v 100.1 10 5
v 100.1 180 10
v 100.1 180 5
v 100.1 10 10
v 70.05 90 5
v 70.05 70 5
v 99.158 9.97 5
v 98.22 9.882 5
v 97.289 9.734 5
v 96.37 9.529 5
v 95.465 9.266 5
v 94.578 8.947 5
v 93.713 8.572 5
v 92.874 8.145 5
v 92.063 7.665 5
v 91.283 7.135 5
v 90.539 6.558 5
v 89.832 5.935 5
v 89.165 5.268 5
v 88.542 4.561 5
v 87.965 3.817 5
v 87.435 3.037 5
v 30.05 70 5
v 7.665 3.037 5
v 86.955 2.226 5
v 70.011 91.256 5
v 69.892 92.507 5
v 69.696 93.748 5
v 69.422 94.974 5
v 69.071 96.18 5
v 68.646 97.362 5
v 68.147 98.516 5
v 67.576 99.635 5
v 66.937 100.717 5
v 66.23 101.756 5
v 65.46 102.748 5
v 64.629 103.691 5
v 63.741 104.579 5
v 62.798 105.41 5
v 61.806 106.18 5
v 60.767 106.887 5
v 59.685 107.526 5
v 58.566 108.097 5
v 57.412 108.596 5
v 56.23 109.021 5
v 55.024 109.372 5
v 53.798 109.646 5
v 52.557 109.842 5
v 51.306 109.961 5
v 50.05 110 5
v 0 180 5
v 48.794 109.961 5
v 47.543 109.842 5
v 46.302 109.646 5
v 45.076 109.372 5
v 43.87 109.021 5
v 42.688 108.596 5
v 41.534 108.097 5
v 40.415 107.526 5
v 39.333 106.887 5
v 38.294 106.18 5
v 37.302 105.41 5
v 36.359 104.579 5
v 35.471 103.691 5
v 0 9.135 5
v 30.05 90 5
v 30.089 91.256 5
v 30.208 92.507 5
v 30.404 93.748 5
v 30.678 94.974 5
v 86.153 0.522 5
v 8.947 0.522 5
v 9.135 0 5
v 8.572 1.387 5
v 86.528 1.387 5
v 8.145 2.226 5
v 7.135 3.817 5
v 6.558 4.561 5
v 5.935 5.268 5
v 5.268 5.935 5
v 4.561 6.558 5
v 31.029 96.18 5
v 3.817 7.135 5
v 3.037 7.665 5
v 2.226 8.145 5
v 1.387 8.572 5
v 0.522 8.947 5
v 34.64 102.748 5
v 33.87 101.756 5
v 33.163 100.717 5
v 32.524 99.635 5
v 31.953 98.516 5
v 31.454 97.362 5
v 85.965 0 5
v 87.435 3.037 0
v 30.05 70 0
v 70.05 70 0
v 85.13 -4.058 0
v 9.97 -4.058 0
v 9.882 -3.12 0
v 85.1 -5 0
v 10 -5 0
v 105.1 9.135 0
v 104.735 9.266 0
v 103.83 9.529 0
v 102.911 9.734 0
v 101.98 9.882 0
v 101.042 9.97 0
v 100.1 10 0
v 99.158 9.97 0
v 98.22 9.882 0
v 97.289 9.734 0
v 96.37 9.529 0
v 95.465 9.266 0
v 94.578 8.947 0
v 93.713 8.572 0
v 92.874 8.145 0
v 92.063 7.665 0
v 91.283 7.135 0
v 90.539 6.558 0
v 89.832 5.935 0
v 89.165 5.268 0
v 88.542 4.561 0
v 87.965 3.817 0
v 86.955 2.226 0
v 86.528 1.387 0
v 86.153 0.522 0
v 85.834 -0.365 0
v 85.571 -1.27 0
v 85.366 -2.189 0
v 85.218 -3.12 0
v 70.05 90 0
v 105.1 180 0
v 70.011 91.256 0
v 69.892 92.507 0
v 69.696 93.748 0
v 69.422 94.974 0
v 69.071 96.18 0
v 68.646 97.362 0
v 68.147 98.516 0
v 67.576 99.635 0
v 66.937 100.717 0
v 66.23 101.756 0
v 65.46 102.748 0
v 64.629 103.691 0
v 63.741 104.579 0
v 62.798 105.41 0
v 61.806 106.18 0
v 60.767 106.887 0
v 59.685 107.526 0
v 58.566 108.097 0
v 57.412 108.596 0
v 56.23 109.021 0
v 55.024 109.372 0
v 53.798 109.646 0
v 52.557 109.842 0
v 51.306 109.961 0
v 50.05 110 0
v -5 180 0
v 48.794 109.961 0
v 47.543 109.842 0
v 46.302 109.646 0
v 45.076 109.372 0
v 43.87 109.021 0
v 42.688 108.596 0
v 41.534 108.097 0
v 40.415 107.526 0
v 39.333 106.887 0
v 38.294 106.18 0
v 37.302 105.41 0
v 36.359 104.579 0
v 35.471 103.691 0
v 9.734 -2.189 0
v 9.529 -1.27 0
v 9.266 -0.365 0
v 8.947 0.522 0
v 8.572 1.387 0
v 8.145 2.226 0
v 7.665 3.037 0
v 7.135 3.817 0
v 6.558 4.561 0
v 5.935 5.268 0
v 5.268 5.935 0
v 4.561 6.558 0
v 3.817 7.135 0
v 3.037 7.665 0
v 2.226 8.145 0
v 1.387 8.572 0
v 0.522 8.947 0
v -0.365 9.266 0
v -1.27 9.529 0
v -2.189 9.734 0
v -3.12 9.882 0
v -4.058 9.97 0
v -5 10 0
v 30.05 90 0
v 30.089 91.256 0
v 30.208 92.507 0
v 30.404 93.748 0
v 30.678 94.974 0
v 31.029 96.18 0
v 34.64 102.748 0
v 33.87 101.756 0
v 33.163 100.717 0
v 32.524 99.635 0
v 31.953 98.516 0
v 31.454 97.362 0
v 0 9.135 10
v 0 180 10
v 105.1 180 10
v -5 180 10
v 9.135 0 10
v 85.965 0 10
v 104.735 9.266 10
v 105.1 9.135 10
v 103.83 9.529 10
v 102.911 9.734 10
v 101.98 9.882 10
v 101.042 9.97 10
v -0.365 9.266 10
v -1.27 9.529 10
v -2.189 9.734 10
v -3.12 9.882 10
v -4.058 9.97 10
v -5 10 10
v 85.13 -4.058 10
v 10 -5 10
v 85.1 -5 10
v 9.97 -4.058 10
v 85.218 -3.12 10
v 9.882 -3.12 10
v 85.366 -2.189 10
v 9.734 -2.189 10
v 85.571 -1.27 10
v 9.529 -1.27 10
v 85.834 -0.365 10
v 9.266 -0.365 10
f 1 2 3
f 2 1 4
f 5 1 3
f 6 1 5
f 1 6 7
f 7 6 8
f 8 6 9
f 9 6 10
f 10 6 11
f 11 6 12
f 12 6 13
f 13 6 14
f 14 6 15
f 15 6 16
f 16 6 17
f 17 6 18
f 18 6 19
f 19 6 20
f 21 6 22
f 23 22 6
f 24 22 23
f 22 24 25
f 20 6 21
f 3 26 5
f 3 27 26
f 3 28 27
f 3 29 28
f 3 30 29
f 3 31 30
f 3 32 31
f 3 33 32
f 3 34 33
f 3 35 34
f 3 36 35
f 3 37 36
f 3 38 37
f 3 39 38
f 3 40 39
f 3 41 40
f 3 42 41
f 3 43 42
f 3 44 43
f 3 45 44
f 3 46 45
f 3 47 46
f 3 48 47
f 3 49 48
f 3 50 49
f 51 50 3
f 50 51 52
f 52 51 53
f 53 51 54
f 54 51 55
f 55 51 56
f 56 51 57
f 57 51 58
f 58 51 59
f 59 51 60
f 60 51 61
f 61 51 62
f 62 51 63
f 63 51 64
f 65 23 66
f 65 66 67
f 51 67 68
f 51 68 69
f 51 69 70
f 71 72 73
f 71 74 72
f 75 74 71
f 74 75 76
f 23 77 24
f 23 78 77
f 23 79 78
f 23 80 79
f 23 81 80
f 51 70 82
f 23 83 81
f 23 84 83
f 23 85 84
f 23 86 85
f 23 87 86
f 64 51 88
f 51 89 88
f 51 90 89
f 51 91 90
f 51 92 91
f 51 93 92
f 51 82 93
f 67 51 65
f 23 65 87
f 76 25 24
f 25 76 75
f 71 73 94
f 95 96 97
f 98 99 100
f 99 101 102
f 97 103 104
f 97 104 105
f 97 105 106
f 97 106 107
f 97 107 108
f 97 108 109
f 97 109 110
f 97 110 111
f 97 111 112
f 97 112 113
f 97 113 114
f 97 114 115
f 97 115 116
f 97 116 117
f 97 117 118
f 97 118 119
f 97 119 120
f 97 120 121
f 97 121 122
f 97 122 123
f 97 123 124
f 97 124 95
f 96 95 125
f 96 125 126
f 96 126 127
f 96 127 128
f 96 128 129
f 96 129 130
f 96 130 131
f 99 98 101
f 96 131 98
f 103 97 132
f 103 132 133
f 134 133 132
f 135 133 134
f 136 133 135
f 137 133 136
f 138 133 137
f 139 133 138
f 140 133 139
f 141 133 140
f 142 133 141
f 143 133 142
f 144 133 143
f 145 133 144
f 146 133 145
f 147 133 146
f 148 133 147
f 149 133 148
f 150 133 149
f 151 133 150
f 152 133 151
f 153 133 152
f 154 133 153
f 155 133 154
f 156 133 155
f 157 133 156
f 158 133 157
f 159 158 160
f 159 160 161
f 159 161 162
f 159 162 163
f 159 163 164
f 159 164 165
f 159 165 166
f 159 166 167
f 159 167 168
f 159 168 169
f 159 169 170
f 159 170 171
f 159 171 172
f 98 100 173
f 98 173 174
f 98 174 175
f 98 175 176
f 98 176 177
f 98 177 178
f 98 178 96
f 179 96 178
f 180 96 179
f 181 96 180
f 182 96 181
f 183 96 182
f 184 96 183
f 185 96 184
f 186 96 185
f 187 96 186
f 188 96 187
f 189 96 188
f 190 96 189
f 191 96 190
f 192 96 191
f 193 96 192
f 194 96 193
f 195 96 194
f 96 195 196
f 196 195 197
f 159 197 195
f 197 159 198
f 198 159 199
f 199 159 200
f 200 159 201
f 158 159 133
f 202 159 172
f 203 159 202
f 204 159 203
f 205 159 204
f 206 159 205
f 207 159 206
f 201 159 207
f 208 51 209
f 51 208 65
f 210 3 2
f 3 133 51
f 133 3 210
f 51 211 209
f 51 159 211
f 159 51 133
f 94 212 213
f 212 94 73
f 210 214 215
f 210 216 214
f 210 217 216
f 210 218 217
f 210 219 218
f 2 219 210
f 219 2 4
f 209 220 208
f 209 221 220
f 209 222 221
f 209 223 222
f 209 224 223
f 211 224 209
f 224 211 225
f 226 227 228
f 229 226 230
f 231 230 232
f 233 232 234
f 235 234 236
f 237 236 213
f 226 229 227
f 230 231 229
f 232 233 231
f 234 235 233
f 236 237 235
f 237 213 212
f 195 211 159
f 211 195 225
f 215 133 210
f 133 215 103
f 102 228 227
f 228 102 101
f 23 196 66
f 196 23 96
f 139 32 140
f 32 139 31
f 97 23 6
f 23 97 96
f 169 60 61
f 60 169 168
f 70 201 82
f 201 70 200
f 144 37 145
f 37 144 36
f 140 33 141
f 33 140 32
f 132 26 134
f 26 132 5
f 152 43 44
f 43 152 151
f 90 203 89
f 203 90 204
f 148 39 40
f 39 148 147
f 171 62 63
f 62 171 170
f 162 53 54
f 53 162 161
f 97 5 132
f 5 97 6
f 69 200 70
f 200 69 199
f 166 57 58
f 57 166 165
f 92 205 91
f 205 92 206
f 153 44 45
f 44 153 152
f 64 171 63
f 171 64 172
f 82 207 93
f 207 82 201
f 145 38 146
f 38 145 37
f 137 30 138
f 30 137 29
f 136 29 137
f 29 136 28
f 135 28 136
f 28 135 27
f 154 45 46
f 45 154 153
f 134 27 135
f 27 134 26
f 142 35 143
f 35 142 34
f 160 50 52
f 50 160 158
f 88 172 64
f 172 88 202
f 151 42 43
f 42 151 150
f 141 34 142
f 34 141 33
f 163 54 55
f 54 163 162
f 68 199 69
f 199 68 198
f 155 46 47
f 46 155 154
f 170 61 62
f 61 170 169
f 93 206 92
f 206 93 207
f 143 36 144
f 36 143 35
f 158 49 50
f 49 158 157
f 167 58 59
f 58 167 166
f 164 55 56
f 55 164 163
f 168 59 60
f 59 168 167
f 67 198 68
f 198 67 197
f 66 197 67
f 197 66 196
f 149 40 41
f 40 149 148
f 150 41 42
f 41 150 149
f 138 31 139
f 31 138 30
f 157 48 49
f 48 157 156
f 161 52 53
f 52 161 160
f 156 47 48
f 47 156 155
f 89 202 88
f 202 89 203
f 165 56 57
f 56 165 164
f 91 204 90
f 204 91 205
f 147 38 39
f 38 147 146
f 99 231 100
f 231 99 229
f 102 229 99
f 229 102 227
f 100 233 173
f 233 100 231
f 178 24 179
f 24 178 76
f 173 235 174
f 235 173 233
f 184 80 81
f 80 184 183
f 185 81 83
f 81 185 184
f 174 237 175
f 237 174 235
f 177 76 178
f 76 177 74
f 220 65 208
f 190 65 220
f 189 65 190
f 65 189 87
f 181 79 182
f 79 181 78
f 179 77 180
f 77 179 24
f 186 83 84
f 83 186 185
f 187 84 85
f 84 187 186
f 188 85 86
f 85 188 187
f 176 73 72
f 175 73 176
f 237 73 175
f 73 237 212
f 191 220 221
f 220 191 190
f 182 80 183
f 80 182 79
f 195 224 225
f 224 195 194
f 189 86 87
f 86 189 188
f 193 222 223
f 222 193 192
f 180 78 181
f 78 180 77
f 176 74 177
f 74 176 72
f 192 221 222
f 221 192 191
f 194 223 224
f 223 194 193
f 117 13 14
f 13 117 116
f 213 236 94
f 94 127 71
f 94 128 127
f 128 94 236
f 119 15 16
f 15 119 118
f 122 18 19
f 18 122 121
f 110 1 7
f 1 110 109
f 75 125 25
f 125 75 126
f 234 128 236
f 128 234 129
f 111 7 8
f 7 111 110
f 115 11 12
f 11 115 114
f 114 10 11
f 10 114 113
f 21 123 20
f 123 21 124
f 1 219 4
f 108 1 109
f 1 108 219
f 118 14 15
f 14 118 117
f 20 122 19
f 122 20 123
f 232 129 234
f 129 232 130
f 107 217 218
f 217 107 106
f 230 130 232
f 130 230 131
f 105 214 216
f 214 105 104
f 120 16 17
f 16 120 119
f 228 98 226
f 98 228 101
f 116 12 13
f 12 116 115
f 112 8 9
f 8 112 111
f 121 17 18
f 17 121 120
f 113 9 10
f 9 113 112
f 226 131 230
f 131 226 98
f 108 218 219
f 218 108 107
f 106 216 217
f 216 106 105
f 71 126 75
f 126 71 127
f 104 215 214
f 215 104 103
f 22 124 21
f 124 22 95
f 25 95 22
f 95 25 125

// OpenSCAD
// Router jig jig!

FromEdge = 70;
Width = 100.1;
InnerWidth = 40;
Wall = 5;

Length = FromEdge + InnerWidth * 1.5 + 50;

$fn = 100;

difference() {
  union() {
    // Plate
    cube([Width, Length, Wall]);
    // Sides
    translate([-Wall,0,0]) cube([Wall, Length, Wall*2]);
    translate([Width,0,0]) cube([Wall, Length, Wall*2]);
    translate([-Wall,-Wall,0]) cube([Width+Wall*2,Wall, Wall*2]);
  }
  // Cut out
  translate([Width/2,FromEdge, -1]) CutOut();
  // Corners
  translate([-Wall,-Wall,-1]) cylinder(r=3*Wall, h=3*Wall);
  translate([Width,-Wall,-1]) cylinder(r=3*Wall, h=3*Wall);
}

module CutOut() {
  translate([0,InnerWidth/2,0])
  linear_extrude(2*Wall) {
    hull() {
      circle(d=InnerWidth);
      translate([-InnerWidth/2,-InnerWidth/2]) square([InnerWidth, InnerWidth/2]);
    };
  }
}
